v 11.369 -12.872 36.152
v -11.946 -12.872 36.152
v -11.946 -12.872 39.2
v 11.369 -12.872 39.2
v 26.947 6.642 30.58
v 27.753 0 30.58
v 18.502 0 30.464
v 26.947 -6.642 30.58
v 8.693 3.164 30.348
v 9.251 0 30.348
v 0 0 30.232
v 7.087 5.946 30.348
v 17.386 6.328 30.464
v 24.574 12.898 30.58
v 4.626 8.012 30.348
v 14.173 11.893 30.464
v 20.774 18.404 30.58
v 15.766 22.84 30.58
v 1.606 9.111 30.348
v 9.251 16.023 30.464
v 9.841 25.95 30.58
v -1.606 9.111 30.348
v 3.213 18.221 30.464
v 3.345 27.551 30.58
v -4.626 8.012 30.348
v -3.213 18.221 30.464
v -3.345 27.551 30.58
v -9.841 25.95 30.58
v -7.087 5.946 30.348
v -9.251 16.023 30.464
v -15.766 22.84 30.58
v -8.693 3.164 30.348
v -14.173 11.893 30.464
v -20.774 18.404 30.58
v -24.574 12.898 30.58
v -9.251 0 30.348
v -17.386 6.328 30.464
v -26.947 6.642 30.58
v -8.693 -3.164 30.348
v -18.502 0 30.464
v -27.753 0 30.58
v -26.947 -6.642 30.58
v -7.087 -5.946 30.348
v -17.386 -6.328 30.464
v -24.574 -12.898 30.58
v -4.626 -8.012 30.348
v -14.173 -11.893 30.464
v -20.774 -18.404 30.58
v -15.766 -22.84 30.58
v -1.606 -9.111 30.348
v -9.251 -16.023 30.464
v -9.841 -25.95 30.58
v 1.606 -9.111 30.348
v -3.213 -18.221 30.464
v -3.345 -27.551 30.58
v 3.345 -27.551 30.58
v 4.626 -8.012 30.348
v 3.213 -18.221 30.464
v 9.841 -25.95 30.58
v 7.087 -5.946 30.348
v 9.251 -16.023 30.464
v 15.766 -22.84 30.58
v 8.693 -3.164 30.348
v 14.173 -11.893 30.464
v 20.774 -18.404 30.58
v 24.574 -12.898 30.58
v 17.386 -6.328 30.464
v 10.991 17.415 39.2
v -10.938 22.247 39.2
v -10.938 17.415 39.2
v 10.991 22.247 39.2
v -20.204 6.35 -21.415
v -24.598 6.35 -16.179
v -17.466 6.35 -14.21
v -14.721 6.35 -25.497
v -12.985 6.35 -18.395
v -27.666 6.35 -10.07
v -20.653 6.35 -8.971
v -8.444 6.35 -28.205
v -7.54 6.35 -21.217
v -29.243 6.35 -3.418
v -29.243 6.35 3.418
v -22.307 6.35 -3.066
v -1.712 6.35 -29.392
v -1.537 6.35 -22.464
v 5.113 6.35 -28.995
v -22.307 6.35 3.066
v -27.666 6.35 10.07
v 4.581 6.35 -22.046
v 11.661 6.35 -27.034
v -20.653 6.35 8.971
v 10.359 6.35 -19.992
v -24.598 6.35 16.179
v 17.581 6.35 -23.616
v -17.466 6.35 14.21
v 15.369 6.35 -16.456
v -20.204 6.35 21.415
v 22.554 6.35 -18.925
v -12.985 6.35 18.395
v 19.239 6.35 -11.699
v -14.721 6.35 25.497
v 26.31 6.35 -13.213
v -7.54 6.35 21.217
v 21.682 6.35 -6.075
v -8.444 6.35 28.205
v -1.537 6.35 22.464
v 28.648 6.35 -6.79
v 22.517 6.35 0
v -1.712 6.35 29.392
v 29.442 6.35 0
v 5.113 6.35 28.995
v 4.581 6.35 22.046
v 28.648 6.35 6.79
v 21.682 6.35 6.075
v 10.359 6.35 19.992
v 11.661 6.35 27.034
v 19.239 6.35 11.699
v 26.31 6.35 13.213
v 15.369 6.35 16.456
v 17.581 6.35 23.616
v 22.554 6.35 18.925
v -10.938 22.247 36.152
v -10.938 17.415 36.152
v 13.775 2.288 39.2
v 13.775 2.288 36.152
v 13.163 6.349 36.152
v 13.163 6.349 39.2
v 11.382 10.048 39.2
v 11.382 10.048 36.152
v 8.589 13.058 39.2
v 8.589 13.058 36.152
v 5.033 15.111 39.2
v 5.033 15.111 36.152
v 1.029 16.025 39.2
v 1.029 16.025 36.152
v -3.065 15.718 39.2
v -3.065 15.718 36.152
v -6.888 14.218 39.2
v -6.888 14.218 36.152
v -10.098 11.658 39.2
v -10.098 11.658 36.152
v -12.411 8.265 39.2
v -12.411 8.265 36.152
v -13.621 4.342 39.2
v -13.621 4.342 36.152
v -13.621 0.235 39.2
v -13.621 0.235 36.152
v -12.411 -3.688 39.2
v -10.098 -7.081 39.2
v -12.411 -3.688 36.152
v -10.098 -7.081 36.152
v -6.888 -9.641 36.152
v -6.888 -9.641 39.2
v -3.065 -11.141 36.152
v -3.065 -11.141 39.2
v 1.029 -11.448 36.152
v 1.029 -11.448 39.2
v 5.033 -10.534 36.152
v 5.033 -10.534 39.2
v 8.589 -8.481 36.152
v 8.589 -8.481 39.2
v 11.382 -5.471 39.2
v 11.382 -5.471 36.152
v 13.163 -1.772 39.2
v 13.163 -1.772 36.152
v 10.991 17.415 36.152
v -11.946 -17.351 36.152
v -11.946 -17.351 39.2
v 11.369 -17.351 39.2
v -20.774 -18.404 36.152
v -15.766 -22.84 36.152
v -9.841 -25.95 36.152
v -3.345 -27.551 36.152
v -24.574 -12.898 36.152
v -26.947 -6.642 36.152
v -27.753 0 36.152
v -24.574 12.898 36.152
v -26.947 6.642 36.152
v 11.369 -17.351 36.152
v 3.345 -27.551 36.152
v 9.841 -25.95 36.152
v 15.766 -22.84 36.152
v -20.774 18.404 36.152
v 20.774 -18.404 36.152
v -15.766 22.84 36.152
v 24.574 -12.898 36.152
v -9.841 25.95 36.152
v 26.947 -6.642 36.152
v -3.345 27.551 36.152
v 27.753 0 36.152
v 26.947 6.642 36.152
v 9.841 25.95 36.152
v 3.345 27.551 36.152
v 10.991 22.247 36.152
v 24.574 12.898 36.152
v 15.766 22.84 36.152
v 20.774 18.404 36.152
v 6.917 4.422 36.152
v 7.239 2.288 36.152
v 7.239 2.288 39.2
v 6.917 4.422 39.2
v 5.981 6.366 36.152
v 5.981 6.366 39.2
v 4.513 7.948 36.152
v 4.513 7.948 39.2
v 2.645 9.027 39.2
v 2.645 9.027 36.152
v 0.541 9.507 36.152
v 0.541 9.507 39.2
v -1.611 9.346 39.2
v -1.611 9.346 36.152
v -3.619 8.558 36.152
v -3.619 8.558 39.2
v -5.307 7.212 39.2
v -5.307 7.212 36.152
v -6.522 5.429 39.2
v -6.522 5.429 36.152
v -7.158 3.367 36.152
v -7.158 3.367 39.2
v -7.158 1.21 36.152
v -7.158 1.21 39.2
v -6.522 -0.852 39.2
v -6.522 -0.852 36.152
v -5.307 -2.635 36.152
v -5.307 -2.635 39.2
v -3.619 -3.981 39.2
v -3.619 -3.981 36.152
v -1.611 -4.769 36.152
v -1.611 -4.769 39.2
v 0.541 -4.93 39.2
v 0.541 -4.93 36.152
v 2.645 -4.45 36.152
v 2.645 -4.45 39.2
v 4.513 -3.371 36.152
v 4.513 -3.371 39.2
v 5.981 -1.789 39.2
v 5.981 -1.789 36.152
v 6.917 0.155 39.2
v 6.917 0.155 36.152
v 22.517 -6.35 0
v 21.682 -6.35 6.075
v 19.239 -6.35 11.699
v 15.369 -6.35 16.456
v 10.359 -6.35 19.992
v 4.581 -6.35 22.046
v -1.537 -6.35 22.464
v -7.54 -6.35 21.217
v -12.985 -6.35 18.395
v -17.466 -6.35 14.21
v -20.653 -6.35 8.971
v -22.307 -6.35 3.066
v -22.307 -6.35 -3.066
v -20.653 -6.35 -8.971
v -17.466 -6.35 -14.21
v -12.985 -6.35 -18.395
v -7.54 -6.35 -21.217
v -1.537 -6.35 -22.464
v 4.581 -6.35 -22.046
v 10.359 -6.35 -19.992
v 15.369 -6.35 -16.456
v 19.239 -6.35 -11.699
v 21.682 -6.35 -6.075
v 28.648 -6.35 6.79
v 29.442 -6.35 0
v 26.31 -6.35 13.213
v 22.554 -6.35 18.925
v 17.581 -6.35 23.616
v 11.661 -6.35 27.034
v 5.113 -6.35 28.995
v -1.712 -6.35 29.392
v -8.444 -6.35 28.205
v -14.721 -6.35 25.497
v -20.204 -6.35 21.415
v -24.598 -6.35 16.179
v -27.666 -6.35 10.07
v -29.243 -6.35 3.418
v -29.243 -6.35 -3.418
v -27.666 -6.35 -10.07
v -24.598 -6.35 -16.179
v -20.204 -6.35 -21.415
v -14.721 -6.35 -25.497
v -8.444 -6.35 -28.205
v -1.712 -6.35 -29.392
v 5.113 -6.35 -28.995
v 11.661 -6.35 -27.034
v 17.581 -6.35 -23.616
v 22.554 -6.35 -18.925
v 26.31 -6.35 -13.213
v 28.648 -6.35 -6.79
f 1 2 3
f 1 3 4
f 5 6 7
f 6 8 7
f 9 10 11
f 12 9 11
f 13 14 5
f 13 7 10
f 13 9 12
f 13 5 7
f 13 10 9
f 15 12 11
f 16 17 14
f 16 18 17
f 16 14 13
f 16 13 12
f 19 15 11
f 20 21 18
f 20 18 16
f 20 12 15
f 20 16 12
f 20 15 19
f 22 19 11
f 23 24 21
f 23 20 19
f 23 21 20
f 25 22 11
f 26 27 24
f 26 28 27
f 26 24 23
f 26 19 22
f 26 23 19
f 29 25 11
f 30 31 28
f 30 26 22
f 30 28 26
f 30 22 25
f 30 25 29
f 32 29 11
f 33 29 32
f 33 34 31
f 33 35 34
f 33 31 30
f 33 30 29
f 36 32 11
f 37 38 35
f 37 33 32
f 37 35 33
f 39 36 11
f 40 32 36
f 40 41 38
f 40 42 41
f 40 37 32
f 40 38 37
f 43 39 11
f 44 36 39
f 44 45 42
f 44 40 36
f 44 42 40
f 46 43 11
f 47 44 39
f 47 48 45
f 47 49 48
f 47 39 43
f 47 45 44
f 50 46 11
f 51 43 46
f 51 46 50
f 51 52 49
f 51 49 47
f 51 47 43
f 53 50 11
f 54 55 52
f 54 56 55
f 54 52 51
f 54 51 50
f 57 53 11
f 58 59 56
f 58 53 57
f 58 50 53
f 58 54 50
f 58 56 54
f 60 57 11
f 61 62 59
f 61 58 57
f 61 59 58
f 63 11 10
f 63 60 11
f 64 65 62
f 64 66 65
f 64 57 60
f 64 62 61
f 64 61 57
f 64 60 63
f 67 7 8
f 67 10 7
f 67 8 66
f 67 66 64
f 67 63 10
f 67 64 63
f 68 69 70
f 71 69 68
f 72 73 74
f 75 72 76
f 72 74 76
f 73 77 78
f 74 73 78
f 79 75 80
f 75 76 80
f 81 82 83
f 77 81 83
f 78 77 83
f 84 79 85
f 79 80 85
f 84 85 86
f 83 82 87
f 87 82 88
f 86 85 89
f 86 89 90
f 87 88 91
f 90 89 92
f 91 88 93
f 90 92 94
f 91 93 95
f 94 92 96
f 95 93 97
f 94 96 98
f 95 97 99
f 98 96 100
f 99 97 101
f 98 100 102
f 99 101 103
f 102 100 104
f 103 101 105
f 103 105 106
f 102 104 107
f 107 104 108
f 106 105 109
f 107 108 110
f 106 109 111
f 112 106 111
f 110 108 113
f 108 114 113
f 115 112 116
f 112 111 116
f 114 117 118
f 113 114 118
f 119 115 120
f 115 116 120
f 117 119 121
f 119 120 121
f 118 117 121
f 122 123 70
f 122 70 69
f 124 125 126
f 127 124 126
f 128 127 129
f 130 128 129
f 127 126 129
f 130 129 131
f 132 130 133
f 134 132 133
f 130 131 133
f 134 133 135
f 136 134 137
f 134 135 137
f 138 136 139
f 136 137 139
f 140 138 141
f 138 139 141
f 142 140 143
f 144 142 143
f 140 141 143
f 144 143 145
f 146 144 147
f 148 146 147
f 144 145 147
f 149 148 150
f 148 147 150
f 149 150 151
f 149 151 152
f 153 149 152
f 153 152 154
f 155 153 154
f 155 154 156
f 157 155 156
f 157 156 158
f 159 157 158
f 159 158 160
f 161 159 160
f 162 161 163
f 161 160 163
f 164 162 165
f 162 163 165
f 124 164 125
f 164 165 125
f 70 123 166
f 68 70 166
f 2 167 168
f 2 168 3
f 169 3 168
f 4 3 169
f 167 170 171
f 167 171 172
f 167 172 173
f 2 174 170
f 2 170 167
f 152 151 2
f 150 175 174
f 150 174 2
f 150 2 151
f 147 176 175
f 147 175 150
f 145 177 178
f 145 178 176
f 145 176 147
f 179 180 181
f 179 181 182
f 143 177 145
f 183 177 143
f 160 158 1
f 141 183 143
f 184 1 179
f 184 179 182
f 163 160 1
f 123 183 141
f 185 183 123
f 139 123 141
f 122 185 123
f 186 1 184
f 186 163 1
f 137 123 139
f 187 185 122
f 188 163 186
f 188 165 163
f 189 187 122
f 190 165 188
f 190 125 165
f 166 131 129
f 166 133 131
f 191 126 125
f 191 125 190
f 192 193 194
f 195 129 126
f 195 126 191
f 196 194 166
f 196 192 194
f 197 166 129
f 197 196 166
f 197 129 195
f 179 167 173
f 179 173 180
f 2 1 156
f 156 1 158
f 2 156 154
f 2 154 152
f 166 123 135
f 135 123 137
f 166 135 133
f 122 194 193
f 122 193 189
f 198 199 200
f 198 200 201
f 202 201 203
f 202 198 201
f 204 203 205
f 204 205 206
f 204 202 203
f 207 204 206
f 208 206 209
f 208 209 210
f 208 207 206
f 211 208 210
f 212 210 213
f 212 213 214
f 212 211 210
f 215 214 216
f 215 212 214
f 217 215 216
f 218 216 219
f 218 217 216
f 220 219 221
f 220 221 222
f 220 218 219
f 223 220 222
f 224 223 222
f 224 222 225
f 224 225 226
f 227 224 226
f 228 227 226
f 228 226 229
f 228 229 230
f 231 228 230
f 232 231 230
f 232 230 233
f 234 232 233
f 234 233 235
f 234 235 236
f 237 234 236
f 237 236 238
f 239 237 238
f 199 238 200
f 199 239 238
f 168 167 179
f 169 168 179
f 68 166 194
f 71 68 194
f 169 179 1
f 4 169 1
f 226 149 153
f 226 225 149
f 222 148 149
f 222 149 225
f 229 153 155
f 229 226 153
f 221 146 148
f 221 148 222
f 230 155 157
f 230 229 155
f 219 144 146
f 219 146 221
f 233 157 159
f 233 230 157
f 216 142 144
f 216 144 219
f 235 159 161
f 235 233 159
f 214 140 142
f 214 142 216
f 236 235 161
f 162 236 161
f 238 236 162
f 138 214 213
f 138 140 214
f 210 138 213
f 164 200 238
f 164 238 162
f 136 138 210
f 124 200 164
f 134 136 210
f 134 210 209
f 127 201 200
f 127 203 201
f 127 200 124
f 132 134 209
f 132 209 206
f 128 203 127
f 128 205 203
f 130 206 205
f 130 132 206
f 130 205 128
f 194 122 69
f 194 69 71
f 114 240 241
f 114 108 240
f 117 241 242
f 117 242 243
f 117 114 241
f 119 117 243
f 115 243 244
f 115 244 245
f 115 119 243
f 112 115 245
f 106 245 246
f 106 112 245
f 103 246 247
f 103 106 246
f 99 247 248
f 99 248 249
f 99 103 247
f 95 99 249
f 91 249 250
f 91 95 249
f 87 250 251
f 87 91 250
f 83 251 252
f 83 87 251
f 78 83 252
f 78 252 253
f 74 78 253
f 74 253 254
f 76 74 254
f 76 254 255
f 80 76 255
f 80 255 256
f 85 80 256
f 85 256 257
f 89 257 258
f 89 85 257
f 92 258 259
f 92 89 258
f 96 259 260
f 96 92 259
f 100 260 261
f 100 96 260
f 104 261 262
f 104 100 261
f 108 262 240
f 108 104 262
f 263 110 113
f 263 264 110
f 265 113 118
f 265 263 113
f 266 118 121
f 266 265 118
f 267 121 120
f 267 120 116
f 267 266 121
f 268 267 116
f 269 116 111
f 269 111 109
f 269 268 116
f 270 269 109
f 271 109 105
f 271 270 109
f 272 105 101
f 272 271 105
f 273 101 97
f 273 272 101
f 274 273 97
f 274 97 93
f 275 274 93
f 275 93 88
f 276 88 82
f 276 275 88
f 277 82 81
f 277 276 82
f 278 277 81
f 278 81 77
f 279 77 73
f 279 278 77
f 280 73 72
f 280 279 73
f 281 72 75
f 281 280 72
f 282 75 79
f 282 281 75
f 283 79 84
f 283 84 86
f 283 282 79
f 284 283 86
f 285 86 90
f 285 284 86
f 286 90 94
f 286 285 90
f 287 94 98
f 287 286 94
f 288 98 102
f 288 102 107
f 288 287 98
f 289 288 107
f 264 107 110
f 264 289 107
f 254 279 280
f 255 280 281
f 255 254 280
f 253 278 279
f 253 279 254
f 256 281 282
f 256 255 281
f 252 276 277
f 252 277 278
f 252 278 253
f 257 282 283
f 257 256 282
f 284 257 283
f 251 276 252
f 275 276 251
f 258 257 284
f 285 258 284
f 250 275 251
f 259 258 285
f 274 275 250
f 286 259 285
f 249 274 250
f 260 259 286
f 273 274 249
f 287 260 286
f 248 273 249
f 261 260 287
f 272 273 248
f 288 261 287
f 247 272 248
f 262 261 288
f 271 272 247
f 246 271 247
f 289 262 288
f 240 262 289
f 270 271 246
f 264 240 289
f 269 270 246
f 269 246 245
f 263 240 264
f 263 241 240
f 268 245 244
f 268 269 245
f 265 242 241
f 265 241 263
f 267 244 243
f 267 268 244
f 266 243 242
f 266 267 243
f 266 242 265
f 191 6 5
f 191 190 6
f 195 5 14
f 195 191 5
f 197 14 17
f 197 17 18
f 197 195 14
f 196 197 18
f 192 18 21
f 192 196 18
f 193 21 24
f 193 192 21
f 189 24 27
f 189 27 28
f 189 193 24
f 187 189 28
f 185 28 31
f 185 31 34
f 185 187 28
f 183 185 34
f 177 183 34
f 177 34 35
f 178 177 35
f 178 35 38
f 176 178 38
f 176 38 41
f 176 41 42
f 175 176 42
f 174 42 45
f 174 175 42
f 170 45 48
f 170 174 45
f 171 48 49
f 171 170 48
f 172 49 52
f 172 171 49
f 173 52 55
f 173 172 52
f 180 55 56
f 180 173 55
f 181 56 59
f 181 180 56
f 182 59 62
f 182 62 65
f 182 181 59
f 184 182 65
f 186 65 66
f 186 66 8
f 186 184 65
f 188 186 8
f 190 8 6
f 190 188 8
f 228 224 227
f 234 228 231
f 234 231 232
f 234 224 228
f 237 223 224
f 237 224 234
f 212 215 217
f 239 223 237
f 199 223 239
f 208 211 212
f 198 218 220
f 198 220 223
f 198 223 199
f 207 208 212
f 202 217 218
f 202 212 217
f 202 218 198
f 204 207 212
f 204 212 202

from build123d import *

# Parameters (mm, degrees)
F0_R     = 29.44181
F0_R_2   = 22.516736
F1_DEPTH = 6.35
F4_W     = 23.315095
F4_H     = 4.478589
F4_R     = 13.775166
F4_R_2   = 7.238941
F4_W_2   = 21.928261
F4_H_2   = 4.832799
F5_DEPTH = 3.048


with BuildPart() as f1:
    # F0 (on Front) → F1 (new body, symmetric)
    with BuildSketch(Plane.XZ):
        Circle(F0_R)
        Circle(F0_R_2, mode=Mode.SUBTRACT)
    extrude(amount=F1_DEPTH, both=True)


with BuildPart() as f3:
    # F2 (on Front) → F3 (revolve)
    with BuildSketch(Plane.XZ):
        Polygon((0, 36.15227), (0, 30.231711), (27.753161, 30.579977), (27.753161, 36.15227), align=None)
    revolve(axis=Axis((0, 0, 33.19199), (0, 0, 1)))

    # F4 (on face) → F5 (join)
    with BuildSketch(Plane.XY.offset(36.15227)):
        with Locations((-0.288241, -15.111262)):
            Rectangle(F4_W, F4_H)
        with Locations((0, 2.288465)):
            Circle(F4_R)
        with Locations((0, 2.288465)):
            Circle(F4_R_2, mode=Mode.SUBTRACT)
        with Locations((0.026374, 19.831036)):
            Rectangle(F4_W_2, F4_H_2)
    extrude(amount=F5_DEPTH)


solid = Compound([f1.part, f3.part])
